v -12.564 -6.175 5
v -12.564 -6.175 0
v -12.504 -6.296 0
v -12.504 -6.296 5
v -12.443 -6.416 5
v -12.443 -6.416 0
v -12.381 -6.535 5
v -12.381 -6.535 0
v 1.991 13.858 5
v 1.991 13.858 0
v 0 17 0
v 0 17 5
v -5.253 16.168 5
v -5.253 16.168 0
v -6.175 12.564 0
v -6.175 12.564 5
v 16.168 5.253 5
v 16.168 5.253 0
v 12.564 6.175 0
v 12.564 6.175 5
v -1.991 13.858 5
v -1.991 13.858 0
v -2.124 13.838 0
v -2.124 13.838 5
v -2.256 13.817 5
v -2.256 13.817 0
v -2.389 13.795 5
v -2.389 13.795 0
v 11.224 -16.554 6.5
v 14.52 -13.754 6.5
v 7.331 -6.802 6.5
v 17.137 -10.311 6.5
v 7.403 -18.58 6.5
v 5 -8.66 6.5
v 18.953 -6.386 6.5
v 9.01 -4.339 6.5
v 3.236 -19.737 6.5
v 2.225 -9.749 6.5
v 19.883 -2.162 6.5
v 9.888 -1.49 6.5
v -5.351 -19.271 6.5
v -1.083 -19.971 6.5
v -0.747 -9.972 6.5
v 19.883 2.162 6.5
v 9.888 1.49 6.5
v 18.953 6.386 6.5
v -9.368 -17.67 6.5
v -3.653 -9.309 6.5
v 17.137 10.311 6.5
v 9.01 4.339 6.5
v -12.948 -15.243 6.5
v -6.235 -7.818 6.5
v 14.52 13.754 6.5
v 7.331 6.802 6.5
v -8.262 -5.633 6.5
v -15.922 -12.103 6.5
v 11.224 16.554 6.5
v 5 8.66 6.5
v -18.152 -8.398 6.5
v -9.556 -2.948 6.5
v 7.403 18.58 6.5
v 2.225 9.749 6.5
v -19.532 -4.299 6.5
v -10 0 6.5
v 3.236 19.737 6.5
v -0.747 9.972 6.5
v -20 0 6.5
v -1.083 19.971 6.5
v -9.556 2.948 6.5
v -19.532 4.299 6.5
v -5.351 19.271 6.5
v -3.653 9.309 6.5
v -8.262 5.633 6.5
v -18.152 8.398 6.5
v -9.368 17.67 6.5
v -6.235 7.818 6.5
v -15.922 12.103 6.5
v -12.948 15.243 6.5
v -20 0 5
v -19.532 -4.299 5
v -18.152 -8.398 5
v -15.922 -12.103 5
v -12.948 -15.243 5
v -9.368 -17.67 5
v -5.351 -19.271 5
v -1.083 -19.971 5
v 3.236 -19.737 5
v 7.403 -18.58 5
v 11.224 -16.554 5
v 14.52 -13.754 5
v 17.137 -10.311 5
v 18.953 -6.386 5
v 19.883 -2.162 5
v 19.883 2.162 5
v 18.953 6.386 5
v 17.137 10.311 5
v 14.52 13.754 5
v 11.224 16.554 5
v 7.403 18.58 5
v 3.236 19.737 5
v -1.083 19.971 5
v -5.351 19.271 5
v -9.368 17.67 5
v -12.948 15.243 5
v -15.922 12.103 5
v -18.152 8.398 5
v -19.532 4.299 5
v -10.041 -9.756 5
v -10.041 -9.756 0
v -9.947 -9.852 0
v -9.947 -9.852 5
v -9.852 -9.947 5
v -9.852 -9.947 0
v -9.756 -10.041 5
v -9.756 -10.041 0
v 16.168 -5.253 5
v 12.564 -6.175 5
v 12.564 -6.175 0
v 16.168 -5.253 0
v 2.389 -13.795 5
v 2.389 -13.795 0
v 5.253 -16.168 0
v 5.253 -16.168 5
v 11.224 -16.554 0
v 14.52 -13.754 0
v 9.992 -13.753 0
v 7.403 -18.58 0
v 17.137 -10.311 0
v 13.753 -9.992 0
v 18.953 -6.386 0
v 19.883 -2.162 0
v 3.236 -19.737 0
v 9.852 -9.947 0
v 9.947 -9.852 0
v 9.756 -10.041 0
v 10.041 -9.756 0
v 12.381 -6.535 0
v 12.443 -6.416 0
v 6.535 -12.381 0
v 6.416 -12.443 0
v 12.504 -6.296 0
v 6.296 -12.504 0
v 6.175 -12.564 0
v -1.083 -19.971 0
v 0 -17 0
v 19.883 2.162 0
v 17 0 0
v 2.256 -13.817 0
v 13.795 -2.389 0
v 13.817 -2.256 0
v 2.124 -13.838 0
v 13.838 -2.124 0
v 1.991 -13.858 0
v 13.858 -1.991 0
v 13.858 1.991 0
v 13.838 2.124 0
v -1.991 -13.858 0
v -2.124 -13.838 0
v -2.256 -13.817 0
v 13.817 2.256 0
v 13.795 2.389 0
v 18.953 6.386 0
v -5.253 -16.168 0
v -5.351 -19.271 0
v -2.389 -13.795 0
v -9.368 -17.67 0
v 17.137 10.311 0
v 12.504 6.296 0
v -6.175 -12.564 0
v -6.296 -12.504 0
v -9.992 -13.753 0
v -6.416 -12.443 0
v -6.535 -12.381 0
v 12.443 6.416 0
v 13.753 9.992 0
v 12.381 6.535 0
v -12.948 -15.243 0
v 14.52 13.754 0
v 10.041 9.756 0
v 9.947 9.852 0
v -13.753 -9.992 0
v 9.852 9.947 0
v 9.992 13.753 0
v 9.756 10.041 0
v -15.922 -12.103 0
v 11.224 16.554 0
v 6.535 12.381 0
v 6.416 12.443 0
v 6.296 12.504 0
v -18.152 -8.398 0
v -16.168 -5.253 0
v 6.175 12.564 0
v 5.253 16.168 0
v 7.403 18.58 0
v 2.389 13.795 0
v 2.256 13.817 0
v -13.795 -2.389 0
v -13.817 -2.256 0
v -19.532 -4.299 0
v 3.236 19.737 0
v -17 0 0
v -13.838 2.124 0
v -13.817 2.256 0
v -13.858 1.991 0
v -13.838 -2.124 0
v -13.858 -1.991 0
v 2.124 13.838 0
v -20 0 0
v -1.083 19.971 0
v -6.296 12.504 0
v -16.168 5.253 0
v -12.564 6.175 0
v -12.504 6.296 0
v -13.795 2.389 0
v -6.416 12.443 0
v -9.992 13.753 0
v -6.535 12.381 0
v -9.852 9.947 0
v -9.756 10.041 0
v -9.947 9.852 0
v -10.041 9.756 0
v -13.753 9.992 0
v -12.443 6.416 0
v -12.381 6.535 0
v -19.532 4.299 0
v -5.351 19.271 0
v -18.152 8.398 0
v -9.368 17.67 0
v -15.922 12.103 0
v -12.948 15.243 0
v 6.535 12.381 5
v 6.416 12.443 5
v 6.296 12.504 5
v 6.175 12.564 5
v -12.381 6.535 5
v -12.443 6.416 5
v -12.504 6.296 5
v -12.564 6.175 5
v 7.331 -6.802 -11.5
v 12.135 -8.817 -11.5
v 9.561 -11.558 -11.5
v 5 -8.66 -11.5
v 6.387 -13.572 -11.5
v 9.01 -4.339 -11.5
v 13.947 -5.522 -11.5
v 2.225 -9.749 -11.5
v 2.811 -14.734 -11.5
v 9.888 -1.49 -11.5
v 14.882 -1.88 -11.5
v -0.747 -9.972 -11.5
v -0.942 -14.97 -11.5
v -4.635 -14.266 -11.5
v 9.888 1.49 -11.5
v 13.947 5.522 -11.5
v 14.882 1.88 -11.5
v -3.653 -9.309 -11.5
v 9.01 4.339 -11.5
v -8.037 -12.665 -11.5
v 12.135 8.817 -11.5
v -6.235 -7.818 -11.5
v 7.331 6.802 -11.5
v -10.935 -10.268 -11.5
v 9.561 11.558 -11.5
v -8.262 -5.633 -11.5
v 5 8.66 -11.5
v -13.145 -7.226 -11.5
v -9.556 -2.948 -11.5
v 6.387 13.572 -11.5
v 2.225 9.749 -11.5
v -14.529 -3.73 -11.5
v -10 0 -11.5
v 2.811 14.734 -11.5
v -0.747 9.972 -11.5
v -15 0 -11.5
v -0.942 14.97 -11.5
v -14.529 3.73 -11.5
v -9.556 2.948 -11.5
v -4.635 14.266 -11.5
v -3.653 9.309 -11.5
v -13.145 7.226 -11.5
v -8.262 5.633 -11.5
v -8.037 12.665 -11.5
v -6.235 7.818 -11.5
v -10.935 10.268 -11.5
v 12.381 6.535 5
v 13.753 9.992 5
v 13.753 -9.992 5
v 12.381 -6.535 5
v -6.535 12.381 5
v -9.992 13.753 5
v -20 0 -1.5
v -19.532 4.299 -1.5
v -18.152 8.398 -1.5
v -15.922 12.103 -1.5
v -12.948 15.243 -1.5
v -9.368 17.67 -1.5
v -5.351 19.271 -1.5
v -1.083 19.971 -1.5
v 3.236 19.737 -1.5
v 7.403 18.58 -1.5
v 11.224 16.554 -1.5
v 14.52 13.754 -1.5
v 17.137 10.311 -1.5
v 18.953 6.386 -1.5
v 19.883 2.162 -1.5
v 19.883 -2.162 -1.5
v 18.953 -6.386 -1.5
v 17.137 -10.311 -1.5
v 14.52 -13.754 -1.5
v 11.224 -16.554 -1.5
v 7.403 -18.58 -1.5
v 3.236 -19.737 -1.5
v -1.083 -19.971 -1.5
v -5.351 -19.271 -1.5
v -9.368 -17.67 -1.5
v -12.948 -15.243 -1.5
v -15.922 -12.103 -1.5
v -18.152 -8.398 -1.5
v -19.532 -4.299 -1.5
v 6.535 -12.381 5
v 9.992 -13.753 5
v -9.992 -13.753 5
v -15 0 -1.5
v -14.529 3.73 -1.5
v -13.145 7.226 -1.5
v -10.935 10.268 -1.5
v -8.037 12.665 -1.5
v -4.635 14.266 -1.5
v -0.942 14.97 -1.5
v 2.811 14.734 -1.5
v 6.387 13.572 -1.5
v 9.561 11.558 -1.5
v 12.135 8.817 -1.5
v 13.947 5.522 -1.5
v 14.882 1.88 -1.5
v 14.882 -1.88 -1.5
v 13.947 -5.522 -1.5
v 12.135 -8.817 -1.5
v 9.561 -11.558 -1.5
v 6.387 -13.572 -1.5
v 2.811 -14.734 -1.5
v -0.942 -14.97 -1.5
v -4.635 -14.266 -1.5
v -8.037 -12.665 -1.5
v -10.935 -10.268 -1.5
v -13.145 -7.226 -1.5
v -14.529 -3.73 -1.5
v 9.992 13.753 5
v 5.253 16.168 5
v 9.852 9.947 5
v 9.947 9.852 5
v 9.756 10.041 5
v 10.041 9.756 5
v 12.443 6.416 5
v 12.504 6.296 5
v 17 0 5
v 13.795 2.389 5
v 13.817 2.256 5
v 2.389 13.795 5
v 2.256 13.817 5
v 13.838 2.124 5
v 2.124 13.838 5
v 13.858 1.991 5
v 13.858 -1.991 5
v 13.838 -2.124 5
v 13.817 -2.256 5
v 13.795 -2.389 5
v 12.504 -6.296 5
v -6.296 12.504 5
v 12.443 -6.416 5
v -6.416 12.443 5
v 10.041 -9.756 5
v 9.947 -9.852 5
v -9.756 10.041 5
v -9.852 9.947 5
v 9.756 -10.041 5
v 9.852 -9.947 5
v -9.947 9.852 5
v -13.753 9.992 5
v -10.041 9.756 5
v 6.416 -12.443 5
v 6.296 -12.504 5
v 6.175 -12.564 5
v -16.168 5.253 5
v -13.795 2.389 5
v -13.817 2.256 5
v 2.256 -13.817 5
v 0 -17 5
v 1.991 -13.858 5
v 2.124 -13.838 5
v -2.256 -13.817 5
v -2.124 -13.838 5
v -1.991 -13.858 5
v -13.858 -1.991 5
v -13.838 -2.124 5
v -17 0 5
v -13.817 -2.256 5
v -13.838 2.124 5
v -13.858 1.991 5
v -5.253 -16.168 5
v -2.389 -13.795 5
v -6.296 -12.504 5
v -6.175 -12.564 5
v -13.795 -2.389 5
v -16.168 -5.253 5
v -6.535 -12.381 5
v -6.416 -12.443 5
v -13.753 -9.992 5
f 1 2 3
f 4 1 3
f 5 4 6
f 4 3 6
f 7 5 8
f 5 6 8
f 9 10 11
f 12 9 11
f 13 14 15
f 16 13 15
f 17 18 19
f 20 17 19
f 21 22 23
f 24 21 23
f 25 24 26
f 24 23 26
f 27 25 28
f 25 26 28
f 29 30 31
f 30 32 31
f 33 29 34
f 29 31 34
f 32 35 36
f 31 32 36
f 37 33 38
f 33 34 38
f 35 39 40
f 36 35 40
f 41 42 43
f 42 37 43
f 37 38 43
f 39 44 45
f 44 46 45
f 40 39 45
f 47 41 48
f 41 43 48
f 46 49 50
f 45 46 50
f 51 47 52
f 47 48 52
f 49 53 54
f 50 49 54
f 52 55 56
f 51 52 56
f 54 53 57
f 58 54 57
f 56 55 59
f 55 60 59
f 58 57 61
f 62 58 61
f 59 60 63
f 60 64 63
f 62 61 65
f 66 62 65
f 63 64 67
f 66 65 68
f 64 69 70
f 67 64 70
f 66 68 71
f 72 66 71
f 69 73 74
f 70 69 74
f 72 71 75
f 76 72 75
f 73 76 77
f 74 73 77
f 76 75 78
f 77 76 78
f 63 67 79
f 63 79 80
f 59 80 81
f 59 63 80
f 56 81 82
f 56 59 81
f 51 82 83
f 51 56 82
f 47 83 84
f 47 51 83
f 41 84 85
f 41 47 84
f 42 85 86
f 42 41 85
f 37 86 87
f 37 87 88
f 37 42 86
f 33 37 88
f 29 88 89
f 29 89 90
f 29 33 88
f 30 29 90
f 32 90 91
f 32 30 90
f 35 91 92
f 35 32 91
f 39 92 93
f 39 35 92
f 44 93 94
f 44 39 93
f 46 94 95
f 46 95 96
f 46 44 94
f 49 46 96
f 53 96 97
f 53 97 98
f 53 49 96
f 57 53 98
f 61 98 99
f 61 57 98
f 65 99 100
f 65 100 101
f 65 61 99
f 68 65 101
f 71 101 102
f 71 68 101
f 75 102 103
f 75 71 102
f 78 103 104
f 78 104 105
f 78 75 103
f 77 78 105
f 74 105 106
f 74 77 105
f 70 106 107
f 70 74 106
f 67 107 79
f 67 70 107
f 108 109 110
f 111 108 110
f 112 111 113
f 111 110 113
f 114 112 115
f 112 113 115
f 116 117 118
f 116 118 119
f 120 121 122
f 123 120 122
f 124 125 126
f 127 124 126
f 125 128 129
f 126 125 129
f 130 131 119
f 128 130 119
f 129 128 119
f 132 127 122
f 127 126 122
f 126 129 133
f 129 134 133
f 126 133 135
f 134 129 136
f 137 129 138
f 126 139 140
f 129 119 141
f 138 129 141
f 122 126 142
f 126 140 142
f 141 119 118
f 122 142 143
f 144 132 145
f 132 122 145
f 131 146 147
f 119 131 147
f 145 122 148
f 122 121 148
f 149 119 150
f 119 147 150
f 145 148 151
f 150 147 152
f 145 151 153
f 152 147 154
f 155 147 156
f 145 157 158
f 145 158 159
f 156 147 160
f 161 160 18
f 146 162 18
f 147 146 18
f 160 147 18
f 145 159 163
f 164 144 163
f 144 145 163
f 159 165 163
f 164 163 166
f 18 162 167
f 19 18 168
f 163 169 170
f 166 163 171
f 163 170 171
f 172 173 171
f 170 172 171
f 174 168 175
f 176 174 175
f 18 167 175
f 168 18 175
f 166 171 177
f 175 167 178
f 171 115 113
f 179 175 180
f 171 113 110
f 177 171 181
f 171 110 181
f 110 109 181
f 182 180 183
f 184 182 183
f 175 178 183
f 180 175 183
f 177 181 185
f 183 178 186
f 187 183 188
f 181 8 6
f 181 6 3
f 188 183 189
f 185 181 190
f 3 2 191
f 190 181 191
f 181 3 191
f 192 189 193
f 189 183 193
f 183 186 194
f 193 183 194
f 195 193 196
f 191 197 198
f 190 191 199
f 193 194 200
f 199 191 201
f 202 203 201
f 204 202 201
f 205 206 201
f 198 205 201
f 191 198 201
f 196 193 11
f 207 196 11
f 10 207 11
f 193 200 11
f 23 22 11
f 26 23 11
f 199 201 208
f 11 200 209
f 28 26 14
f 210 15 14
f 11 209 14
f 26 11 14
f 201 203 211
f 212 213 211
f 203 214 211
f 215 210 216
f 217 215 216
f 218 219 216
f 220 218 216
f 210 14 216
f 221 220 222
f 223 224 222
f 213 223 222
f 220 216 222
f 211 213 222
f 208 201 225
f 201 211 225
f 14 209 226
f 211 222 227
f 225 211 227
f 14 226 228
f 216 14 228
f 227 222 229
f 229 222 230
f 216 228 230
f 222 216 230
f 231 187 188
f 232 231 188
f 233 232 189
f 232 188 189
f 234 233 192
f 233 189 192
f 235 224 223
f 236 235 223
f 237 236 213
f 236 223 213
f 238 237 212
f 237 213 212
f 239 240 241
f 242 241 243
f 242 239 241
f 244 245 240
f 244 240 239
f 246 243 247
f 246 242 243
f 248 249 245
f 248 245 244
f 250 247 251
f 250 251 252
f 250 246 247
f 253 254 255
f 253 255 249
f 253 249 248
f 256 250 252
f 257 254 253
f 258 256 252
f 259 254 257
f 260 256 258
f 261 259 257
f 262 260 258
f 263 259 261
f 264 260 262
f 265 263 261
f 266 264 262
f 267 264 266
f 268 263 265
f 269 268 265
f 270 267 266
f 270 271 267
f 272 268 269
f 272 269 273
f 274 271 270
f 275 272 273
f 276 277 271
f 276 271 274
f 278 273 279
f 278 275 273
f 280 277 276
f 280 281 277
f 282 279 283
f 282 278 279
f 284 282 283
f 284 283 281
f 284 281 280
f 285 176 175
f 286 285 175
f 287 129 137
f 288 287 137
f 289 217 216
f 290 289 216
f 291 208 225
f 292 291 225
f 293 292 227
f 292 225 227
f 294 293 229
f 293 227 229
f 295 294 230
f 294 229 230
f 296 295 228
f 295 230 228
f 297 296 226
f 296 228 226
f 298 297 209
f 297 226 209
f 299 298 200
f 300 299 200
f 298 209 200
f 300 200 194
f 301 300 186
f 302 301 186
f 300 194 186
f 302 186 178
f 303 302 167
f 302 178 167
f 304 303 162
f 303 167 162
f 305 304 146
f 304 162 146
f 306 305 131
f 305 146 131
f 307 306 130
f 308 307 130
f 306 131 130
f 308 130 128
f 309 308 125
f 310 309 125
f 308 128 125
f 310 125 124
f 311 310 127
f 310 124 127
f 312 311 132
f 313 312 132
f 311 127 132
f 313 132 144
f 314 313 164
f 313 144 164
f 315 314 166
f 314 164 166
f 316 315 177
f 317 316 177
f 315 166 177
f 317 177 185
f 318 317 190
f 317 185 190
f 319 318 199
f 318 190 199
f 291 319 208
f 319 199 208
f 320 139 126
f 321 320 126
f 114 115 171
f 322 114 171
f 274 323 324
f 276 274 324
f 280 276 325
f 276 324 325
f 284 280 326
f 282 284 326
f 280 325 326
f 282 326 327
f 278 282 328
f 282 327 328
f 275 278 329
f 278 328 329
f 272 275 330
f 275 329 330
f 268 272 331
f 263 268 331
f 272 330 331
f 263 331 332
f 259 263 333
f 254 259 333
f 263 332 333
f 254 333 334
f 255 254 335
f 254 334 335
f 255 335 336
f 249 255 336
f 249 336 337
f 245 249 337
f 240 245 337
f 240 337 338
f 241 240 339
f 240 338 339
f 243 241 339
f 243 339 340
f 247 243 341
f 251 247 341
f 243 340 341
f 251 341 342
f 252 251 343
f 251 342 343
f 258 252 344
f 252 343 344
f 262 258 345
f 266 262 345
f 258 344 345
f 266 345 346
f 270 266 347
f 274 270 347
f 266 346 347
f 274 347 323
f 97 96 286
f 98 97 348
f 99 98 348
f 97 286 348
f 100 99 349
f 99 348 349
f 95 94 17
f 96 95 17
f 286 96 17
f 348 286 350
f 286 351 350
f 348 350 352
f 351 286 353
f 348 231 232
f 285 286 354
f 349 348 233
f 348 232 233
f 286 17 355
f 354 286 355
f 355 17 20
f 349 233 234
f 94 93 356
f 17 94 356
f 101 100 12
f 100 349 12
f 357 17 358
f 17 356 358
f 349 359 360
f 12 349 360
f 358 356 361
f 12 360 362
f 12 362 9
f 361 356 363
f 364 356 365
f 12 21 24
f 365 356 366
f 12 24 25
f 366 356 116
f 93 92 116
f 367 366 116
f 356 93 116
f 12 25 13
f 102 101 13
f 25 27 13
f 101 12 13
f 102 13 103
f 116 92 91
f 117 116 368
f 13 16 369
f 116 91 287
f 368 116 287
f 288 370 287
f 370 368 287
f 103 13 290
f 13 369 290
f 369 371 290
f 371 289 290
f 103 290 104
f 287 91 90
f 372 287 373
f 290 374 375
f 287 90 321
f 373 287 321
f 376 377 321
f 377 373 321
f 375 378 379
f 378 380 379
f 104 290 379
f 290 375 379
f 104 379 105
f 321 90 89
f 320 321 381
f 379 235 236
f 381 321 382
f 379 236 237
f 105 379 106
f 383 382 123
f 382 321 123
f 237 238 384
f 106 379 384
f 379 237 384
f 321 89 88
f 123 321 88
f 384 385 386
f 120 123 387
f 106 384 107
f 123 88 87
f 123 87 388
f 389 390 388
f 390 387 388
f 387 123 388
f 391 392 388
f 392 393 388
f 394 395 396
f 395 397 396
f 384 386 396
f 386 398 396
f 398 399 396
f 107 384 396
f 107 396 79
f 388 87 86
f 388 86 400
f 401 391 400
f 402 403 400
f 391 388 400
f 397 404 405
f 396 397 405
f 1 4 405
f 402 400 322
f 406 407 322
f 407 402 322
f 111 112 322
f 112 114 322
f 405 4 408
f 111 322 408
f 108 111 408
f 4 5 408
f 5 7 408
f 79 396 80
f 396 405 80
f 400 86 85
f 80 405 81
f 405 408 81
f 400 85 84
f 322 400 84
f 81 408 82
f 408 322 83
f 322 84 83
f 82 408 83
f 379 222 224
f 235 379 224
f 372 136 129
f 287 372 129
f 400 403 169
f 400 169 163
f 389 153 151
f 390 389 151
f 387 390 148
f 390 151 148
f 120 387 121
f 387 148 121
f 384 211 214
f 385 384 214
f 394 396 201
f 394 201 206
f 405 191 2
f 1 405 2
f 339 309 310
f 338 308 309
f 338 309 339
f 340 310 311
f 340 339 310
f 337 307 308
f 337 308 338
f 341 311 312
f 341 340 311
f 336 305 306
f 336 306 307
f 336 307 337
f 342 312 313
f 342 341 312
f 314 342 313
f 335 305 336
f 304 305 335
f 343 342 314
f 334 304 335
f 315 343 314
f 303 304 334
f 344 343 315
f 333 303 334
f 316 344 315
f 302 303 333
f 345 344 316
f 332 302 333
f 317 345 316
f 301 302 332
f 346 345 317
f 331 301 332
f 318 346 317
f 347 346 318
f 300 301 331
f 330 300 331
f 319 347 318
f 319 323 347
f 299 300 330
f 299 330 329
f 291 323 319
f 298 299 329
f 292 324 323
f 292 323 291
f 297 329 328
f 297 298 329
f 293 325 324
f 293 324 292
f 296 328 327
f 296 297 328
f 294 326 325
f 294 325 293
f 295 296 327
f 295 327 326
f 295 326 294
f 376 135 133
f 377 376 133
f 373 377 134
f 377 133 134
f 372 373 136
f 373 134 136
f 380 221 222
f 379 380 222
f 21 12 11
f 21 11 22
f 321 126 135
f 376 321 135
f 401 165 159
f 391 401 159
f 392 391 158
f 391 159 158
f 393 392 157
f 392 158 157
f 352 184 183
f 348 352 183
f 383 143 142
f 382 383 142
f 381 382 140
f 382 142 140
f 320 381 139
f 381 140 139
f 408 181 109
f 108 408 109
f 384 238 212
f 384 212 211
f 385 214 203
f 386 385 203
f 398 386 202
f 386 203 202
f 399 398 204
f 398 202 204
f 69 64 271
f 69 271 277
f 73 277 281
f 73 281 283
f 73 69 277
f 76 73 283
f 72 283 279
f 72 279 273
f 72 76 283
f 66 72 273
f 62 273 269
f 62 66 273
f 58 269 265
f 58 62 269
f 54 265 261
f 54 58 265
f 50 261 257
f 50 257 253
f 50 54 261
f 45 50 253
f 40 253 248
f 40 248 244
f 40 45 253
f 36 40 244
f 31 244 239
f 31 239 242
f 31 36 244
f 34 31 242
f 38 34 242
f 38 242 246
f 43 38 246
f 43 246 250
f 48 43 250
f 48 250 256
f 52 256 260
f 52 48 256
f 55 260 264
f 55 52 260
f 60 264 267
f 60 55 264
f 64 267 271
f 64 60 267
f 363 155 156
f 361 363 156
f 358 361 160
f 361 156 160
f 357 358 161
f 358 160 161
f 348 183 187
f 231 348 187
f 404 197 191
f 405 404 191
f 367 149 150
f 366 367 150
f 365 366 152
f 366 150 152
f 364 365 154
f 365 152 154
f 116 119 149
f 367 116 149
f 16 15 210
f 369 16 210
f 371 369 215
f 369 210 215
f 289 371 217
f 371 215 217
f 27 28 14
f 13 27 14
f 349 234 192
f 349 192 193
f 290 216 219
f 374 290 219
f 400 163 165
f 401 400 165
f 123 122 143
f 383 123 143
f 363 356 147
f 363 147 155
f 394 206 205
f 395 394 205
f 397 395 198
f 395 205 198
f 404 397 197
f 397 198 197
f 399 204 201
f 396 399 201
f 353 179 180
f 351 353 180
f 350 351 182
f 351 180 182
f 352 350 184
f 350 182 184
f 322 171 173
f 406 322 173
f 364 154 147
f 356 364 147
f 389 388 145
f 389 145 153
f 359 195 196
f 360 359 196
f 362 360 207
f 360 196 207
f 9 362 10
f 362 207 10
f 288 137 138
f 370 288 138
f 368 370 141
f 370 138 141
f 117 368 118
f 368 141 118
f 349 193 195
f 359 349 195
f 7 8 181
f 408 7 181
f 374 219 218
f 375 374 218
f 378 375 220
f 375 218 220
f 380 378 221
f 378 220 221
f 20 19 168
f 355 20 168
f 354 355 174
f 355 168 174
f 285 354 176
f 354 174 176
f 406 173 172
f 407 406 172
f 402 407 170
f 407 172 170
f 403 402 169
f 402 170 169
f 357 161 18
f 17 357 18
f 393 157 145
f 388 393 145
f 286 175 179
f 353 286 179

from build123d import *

# Parameters (mm, degrees)
BOSS_EXTRUDE1_DEPTH = 5
SKETCH2_R           = 20
BOSS_EXTRUDE2_DEPTH = 1.5
BOSS_EXTRUDE3_START = 1.5
SKETCH3_R           = 20
BOSS_EXTRUDE3_DEPTH = 1.5
SKETCH4_R           = 13
CUT_EXTRUDE1_DEPTH  = 11.5
SKETCH5_R           = 15
BOSS_EXTRUDE4_DEPTH = 10
CUT_EXTRUDE2_START  = -30
SKETCH6_R           = 13
CUT_EXTRUDE2_DEPTH  = 30
BOSS_EXTRUDE5_START = -18
SKETCH7_R           = 13
SKETCH7_R_2         = 10
BOSS_EXTRUDE5_DEPTH = 18


with BuildPart() as part:
    # Sketch1 → Boss-Extrude1 (new body)
    with BuildSketch(Plane.XY):
        with BuildLine():
            Line((0, 17), (-1.990617103, 13.857757522))
            ThreePointArc((-1.990617103, 13.857757522), (-2.190082511, 13.827636768), (-2.389093211, 13.794645107))
            Line((-2.389093211, 13.794645107), (-5.253288904, 16.167960777))
            Line((-5.253288904, 16.167960777), (-6.175471945, 12.564376079))
            ThreePointArc((-6.175471945, 12.564376079), (-6.355866996, 12.474091339), (-6.534942436, 12.381216715))
            Line((-6.534942436, 12.381216715), (-9.992349289, 13.753288904))
            Line((-9.992349289, 13.753288904), (-9.755828567, 10.041105964))
            ThreePointArc((-9.755828567, 10.041105964), (-9.899494937, 9.899494937), (-10.041105964, 9.755828567))
            Line((-10.041105964, 9.755828567), (-13.753288904, 9.992349289))
            Line((-13.753288904, 9.992349289), (-12.381216715, 6.534942436))
            ThreePointArc((-12.381216715, 6.534942436), (-12.474091339, 6.355866996), (-12.564376079, 6.175471945))
            Line((-12.564376079, 6.175471945), (-16.167960777, 5.253288904))
            Line((-16.167960777, 5.253288904), (-13.794645107, 2.389093211))
            ThreePointArc((-13.794645107, 2.389093211), (-13.827636768, 2.190082511), (-13.857757522, 1.990617103))
            Line((-13.857757522, 1.990617103), (-17, 0))
            Line((-17, 0), (-13.857757522, -1.990617103))
            ThreePointArc((-13.857757522, -1.990617103), (-13.827636768, -2.190082511), (-13.794645107, -2.389093211))
            Line((-13.794645107, -2.389093211), (-16.167960777, -5.253288904))
            Line((-16.167960777, -5.253288904), (-12.564376079, -6.175471945))
            ThreePointArc((-12.564376079, -6.175471945), (-12.474091339, -6.355866996), (-12.381216715, -6.534942436))
            Line((-12.381216715, -6.534942436), (-13.753288904, -9.992349289))
            Line((-13.753288904, -9.992349289), (-10.041105964, -9.755828567))
            ThreePointArc((-10.041105964, -9.755828567), (-9.899494937, -9.899494937), (-9.755828567, -10.041105964))
            Line((-9.755828567, -10.041105964), (-9.992349289, -13.753288904))
            Line((-9.992349289, -13.753288904), (-6.534942436, -12.381216715))
            ThreePointArc((-6.534942436, -12.381216715), (-6.355866996, -12.474091339), (-6.175471945, -12.564376079))
            Line((-6.175471945, -12.564376079), (-5.253288904, -16.167960777))
            Line((-5.253288904, -16.167960777), (-2.389093211, -13.794645107))
            ThreePointArc((-2.389093211, -13.794645107), (-2.190082511, -13.827636768), (-1.990617103, -13.857757522))
            Line((-1.990617103, -13.857757522), (0, -17))
            Line((0, -17), (1.990617103, -13.857757522))
            ThreePointArc((1.990617103, -13.857757522), (2.190082511, -13.827636768), (2.389093211, -13.794645107))
            Line((2.389093211, -13.794645107), (5.253288904, -16.167960777))
            Line((5.253288904, -16.167960777), (6.175471945, -12.564376079))
            ThreePointArc((6.175471945, -12.564376079), (6.355866996, -12.474091339), (6.534942436, -12.381216715))
            Line((6.534942436, -12.381216715), (9.992349289, -13.753288904))
            Line((9.992349289, -13.753288904), (9.755828567, -10.041105964))
            ThreePointArc((9.755828567, -10.041105964), (9.899494937, -9.899494937), (10.041105964, -9.755828567))
            Line((10.041105964, -9.755828567), (13.753288904, -9.992349289))
            Line((13.753288904, -9.992349289), (12.381216715, -6.534942436))
            ThreePointArc((12.381216715, -6.534942436), (12.474091339, -6.355866996), (12.564376079, -6.175471945))
            Line((12.564376079, -6.175471945), (16.167960777, -5.253288904))
            Line((16.167960777, -5.253288904), (13.794645107, -2.389093211))
            ThreePointArc((13.794645107, -2.389093211), (13.827636768, -2.190082511), (13.857757522, -1.990617103))
            Line((13.857757522, -1.990617103), (17, 0))
            Line((17, 0), (13.857757522, 1.990617103))
            ThreePointArc((13.857757522, 1.990617103), (13.827636768, 2.190082511), (13.794645107, 2.389093211))
            Line((13.794645107, 2.389093211), (16.167960777, 5.253288904))
            Line((16.167960777, 5.253288904), (12.564376079, 6.175471945))
            ThreePointArc((12.564376079, 6.175471945), (12.474091339, 6.355866996), (12.381216715, 6.534942436))
            Line((12.381216715, 6.534942436), (13.753288904, 9.992349289))
            Line((13.753288904, 9.992349289), (10.041105964, 9.755828567))
            ThreePointArc((10.041105964, 9.755828567), (9.899494937, 9.899494937), (9.755828567, 10.041105964))
            Line((9.755828567, 10.041105964), (9.992349289, 13.753288904))
            Line((9.992349289, 13.753288904), (6.534942436, 12.381216715))
            ThreePointArc((6.534942436, 12.381216715), (6.355866996, 12.474091339), (6.175471945, 12.564376079))
            Line((6.175471945, 12.564376079), (5.253288904, 16.167960777))
            Line((5.253288904, 16.167960777), (2.389093211, 13.794645107))
            ThreePointArc((2.389093211, 13.794645107), (2.190082511, 13.827636768), (1.990617103, 13.857757522))
            Line((1.990617103, 13.857757522), (0, 17))
        make_face()
    extrude(amount=BOSS_EXTRUDE1_DEPTH)

    # Sketch2 → Boss-Extrude2 (add)
    with BuildSketch(Plane(origin=(0, 0, 0), x_dir=(-1, 0, 0), z_dir=(0, 0, -1))):
        Circle(SKETCH2_R)
    extrude(amount=BOSS_EXTRUDE2_DEPTH)

    # Sketch3 → Boss-Extrude3 (add)
    with BuildSketch(Plane.XY.offset(5).offset(BOSS_EXTRUDE3_START)):
        with Locations(Location((0, 0, 0), (0, 0, 180))):
            Circle(SKETCH3_R)
    extrude(amount=-BOSS_EXTRUDE3_DEPTH)

    # Sketch4 → Cut-Extrude1 (cut)
    with BuildSketch(Plane.XY.offset(6.5)):
        Circle(SKETCH4_R)
    extrude(amount=-CUT_EXTRUDE1_DEPTH, mode=Mode.SUBTRACT)

    # Sketch5 → Boss-Extrude4 (add)
    with BuildSketch(Plane(origin=(0, 0, -1.5), x_dir=(-1, 0, 0), z_dir=(0, 0, -1))):
        Circle(SKETCH5_R)
    extrude(amount=BOSS_EXTRUDE4_DEPTH)

    # Sketch6 → Cut-Extrude2 (cut)
    with BuildSketch(Plane(origin=(0, 0, -11.5), x_dir=(-1, 0, 0), z_dir=(0, 0, -1)).offset(CUT_EXTRUDE2_START)):
        with Locations(Location((0, 0, 0), (0, 0, 180))):
            Circle(SKETCH6_R)
    extrude(amount=CUT_EXTRUDE2_DEPTH, mode=Mode.SUBTRACT)

    # Sketch7 → Boss-Extrude5 (add)
    with BuildSketch(Plane(origin=(0, 0, -11.5), x_dir=(-1, 0, 0), z_dir=(0, 0, -1)).offset(BOSS_EXTRUDE5_START)):
        Circle(SKETCH7_R)
        Circle(SKETCH7_R_2, mode=Mode.SUBTRACT)
    extrude(amount=BOSS_EXTRUDE5_DEPTH)


solid = part.part
